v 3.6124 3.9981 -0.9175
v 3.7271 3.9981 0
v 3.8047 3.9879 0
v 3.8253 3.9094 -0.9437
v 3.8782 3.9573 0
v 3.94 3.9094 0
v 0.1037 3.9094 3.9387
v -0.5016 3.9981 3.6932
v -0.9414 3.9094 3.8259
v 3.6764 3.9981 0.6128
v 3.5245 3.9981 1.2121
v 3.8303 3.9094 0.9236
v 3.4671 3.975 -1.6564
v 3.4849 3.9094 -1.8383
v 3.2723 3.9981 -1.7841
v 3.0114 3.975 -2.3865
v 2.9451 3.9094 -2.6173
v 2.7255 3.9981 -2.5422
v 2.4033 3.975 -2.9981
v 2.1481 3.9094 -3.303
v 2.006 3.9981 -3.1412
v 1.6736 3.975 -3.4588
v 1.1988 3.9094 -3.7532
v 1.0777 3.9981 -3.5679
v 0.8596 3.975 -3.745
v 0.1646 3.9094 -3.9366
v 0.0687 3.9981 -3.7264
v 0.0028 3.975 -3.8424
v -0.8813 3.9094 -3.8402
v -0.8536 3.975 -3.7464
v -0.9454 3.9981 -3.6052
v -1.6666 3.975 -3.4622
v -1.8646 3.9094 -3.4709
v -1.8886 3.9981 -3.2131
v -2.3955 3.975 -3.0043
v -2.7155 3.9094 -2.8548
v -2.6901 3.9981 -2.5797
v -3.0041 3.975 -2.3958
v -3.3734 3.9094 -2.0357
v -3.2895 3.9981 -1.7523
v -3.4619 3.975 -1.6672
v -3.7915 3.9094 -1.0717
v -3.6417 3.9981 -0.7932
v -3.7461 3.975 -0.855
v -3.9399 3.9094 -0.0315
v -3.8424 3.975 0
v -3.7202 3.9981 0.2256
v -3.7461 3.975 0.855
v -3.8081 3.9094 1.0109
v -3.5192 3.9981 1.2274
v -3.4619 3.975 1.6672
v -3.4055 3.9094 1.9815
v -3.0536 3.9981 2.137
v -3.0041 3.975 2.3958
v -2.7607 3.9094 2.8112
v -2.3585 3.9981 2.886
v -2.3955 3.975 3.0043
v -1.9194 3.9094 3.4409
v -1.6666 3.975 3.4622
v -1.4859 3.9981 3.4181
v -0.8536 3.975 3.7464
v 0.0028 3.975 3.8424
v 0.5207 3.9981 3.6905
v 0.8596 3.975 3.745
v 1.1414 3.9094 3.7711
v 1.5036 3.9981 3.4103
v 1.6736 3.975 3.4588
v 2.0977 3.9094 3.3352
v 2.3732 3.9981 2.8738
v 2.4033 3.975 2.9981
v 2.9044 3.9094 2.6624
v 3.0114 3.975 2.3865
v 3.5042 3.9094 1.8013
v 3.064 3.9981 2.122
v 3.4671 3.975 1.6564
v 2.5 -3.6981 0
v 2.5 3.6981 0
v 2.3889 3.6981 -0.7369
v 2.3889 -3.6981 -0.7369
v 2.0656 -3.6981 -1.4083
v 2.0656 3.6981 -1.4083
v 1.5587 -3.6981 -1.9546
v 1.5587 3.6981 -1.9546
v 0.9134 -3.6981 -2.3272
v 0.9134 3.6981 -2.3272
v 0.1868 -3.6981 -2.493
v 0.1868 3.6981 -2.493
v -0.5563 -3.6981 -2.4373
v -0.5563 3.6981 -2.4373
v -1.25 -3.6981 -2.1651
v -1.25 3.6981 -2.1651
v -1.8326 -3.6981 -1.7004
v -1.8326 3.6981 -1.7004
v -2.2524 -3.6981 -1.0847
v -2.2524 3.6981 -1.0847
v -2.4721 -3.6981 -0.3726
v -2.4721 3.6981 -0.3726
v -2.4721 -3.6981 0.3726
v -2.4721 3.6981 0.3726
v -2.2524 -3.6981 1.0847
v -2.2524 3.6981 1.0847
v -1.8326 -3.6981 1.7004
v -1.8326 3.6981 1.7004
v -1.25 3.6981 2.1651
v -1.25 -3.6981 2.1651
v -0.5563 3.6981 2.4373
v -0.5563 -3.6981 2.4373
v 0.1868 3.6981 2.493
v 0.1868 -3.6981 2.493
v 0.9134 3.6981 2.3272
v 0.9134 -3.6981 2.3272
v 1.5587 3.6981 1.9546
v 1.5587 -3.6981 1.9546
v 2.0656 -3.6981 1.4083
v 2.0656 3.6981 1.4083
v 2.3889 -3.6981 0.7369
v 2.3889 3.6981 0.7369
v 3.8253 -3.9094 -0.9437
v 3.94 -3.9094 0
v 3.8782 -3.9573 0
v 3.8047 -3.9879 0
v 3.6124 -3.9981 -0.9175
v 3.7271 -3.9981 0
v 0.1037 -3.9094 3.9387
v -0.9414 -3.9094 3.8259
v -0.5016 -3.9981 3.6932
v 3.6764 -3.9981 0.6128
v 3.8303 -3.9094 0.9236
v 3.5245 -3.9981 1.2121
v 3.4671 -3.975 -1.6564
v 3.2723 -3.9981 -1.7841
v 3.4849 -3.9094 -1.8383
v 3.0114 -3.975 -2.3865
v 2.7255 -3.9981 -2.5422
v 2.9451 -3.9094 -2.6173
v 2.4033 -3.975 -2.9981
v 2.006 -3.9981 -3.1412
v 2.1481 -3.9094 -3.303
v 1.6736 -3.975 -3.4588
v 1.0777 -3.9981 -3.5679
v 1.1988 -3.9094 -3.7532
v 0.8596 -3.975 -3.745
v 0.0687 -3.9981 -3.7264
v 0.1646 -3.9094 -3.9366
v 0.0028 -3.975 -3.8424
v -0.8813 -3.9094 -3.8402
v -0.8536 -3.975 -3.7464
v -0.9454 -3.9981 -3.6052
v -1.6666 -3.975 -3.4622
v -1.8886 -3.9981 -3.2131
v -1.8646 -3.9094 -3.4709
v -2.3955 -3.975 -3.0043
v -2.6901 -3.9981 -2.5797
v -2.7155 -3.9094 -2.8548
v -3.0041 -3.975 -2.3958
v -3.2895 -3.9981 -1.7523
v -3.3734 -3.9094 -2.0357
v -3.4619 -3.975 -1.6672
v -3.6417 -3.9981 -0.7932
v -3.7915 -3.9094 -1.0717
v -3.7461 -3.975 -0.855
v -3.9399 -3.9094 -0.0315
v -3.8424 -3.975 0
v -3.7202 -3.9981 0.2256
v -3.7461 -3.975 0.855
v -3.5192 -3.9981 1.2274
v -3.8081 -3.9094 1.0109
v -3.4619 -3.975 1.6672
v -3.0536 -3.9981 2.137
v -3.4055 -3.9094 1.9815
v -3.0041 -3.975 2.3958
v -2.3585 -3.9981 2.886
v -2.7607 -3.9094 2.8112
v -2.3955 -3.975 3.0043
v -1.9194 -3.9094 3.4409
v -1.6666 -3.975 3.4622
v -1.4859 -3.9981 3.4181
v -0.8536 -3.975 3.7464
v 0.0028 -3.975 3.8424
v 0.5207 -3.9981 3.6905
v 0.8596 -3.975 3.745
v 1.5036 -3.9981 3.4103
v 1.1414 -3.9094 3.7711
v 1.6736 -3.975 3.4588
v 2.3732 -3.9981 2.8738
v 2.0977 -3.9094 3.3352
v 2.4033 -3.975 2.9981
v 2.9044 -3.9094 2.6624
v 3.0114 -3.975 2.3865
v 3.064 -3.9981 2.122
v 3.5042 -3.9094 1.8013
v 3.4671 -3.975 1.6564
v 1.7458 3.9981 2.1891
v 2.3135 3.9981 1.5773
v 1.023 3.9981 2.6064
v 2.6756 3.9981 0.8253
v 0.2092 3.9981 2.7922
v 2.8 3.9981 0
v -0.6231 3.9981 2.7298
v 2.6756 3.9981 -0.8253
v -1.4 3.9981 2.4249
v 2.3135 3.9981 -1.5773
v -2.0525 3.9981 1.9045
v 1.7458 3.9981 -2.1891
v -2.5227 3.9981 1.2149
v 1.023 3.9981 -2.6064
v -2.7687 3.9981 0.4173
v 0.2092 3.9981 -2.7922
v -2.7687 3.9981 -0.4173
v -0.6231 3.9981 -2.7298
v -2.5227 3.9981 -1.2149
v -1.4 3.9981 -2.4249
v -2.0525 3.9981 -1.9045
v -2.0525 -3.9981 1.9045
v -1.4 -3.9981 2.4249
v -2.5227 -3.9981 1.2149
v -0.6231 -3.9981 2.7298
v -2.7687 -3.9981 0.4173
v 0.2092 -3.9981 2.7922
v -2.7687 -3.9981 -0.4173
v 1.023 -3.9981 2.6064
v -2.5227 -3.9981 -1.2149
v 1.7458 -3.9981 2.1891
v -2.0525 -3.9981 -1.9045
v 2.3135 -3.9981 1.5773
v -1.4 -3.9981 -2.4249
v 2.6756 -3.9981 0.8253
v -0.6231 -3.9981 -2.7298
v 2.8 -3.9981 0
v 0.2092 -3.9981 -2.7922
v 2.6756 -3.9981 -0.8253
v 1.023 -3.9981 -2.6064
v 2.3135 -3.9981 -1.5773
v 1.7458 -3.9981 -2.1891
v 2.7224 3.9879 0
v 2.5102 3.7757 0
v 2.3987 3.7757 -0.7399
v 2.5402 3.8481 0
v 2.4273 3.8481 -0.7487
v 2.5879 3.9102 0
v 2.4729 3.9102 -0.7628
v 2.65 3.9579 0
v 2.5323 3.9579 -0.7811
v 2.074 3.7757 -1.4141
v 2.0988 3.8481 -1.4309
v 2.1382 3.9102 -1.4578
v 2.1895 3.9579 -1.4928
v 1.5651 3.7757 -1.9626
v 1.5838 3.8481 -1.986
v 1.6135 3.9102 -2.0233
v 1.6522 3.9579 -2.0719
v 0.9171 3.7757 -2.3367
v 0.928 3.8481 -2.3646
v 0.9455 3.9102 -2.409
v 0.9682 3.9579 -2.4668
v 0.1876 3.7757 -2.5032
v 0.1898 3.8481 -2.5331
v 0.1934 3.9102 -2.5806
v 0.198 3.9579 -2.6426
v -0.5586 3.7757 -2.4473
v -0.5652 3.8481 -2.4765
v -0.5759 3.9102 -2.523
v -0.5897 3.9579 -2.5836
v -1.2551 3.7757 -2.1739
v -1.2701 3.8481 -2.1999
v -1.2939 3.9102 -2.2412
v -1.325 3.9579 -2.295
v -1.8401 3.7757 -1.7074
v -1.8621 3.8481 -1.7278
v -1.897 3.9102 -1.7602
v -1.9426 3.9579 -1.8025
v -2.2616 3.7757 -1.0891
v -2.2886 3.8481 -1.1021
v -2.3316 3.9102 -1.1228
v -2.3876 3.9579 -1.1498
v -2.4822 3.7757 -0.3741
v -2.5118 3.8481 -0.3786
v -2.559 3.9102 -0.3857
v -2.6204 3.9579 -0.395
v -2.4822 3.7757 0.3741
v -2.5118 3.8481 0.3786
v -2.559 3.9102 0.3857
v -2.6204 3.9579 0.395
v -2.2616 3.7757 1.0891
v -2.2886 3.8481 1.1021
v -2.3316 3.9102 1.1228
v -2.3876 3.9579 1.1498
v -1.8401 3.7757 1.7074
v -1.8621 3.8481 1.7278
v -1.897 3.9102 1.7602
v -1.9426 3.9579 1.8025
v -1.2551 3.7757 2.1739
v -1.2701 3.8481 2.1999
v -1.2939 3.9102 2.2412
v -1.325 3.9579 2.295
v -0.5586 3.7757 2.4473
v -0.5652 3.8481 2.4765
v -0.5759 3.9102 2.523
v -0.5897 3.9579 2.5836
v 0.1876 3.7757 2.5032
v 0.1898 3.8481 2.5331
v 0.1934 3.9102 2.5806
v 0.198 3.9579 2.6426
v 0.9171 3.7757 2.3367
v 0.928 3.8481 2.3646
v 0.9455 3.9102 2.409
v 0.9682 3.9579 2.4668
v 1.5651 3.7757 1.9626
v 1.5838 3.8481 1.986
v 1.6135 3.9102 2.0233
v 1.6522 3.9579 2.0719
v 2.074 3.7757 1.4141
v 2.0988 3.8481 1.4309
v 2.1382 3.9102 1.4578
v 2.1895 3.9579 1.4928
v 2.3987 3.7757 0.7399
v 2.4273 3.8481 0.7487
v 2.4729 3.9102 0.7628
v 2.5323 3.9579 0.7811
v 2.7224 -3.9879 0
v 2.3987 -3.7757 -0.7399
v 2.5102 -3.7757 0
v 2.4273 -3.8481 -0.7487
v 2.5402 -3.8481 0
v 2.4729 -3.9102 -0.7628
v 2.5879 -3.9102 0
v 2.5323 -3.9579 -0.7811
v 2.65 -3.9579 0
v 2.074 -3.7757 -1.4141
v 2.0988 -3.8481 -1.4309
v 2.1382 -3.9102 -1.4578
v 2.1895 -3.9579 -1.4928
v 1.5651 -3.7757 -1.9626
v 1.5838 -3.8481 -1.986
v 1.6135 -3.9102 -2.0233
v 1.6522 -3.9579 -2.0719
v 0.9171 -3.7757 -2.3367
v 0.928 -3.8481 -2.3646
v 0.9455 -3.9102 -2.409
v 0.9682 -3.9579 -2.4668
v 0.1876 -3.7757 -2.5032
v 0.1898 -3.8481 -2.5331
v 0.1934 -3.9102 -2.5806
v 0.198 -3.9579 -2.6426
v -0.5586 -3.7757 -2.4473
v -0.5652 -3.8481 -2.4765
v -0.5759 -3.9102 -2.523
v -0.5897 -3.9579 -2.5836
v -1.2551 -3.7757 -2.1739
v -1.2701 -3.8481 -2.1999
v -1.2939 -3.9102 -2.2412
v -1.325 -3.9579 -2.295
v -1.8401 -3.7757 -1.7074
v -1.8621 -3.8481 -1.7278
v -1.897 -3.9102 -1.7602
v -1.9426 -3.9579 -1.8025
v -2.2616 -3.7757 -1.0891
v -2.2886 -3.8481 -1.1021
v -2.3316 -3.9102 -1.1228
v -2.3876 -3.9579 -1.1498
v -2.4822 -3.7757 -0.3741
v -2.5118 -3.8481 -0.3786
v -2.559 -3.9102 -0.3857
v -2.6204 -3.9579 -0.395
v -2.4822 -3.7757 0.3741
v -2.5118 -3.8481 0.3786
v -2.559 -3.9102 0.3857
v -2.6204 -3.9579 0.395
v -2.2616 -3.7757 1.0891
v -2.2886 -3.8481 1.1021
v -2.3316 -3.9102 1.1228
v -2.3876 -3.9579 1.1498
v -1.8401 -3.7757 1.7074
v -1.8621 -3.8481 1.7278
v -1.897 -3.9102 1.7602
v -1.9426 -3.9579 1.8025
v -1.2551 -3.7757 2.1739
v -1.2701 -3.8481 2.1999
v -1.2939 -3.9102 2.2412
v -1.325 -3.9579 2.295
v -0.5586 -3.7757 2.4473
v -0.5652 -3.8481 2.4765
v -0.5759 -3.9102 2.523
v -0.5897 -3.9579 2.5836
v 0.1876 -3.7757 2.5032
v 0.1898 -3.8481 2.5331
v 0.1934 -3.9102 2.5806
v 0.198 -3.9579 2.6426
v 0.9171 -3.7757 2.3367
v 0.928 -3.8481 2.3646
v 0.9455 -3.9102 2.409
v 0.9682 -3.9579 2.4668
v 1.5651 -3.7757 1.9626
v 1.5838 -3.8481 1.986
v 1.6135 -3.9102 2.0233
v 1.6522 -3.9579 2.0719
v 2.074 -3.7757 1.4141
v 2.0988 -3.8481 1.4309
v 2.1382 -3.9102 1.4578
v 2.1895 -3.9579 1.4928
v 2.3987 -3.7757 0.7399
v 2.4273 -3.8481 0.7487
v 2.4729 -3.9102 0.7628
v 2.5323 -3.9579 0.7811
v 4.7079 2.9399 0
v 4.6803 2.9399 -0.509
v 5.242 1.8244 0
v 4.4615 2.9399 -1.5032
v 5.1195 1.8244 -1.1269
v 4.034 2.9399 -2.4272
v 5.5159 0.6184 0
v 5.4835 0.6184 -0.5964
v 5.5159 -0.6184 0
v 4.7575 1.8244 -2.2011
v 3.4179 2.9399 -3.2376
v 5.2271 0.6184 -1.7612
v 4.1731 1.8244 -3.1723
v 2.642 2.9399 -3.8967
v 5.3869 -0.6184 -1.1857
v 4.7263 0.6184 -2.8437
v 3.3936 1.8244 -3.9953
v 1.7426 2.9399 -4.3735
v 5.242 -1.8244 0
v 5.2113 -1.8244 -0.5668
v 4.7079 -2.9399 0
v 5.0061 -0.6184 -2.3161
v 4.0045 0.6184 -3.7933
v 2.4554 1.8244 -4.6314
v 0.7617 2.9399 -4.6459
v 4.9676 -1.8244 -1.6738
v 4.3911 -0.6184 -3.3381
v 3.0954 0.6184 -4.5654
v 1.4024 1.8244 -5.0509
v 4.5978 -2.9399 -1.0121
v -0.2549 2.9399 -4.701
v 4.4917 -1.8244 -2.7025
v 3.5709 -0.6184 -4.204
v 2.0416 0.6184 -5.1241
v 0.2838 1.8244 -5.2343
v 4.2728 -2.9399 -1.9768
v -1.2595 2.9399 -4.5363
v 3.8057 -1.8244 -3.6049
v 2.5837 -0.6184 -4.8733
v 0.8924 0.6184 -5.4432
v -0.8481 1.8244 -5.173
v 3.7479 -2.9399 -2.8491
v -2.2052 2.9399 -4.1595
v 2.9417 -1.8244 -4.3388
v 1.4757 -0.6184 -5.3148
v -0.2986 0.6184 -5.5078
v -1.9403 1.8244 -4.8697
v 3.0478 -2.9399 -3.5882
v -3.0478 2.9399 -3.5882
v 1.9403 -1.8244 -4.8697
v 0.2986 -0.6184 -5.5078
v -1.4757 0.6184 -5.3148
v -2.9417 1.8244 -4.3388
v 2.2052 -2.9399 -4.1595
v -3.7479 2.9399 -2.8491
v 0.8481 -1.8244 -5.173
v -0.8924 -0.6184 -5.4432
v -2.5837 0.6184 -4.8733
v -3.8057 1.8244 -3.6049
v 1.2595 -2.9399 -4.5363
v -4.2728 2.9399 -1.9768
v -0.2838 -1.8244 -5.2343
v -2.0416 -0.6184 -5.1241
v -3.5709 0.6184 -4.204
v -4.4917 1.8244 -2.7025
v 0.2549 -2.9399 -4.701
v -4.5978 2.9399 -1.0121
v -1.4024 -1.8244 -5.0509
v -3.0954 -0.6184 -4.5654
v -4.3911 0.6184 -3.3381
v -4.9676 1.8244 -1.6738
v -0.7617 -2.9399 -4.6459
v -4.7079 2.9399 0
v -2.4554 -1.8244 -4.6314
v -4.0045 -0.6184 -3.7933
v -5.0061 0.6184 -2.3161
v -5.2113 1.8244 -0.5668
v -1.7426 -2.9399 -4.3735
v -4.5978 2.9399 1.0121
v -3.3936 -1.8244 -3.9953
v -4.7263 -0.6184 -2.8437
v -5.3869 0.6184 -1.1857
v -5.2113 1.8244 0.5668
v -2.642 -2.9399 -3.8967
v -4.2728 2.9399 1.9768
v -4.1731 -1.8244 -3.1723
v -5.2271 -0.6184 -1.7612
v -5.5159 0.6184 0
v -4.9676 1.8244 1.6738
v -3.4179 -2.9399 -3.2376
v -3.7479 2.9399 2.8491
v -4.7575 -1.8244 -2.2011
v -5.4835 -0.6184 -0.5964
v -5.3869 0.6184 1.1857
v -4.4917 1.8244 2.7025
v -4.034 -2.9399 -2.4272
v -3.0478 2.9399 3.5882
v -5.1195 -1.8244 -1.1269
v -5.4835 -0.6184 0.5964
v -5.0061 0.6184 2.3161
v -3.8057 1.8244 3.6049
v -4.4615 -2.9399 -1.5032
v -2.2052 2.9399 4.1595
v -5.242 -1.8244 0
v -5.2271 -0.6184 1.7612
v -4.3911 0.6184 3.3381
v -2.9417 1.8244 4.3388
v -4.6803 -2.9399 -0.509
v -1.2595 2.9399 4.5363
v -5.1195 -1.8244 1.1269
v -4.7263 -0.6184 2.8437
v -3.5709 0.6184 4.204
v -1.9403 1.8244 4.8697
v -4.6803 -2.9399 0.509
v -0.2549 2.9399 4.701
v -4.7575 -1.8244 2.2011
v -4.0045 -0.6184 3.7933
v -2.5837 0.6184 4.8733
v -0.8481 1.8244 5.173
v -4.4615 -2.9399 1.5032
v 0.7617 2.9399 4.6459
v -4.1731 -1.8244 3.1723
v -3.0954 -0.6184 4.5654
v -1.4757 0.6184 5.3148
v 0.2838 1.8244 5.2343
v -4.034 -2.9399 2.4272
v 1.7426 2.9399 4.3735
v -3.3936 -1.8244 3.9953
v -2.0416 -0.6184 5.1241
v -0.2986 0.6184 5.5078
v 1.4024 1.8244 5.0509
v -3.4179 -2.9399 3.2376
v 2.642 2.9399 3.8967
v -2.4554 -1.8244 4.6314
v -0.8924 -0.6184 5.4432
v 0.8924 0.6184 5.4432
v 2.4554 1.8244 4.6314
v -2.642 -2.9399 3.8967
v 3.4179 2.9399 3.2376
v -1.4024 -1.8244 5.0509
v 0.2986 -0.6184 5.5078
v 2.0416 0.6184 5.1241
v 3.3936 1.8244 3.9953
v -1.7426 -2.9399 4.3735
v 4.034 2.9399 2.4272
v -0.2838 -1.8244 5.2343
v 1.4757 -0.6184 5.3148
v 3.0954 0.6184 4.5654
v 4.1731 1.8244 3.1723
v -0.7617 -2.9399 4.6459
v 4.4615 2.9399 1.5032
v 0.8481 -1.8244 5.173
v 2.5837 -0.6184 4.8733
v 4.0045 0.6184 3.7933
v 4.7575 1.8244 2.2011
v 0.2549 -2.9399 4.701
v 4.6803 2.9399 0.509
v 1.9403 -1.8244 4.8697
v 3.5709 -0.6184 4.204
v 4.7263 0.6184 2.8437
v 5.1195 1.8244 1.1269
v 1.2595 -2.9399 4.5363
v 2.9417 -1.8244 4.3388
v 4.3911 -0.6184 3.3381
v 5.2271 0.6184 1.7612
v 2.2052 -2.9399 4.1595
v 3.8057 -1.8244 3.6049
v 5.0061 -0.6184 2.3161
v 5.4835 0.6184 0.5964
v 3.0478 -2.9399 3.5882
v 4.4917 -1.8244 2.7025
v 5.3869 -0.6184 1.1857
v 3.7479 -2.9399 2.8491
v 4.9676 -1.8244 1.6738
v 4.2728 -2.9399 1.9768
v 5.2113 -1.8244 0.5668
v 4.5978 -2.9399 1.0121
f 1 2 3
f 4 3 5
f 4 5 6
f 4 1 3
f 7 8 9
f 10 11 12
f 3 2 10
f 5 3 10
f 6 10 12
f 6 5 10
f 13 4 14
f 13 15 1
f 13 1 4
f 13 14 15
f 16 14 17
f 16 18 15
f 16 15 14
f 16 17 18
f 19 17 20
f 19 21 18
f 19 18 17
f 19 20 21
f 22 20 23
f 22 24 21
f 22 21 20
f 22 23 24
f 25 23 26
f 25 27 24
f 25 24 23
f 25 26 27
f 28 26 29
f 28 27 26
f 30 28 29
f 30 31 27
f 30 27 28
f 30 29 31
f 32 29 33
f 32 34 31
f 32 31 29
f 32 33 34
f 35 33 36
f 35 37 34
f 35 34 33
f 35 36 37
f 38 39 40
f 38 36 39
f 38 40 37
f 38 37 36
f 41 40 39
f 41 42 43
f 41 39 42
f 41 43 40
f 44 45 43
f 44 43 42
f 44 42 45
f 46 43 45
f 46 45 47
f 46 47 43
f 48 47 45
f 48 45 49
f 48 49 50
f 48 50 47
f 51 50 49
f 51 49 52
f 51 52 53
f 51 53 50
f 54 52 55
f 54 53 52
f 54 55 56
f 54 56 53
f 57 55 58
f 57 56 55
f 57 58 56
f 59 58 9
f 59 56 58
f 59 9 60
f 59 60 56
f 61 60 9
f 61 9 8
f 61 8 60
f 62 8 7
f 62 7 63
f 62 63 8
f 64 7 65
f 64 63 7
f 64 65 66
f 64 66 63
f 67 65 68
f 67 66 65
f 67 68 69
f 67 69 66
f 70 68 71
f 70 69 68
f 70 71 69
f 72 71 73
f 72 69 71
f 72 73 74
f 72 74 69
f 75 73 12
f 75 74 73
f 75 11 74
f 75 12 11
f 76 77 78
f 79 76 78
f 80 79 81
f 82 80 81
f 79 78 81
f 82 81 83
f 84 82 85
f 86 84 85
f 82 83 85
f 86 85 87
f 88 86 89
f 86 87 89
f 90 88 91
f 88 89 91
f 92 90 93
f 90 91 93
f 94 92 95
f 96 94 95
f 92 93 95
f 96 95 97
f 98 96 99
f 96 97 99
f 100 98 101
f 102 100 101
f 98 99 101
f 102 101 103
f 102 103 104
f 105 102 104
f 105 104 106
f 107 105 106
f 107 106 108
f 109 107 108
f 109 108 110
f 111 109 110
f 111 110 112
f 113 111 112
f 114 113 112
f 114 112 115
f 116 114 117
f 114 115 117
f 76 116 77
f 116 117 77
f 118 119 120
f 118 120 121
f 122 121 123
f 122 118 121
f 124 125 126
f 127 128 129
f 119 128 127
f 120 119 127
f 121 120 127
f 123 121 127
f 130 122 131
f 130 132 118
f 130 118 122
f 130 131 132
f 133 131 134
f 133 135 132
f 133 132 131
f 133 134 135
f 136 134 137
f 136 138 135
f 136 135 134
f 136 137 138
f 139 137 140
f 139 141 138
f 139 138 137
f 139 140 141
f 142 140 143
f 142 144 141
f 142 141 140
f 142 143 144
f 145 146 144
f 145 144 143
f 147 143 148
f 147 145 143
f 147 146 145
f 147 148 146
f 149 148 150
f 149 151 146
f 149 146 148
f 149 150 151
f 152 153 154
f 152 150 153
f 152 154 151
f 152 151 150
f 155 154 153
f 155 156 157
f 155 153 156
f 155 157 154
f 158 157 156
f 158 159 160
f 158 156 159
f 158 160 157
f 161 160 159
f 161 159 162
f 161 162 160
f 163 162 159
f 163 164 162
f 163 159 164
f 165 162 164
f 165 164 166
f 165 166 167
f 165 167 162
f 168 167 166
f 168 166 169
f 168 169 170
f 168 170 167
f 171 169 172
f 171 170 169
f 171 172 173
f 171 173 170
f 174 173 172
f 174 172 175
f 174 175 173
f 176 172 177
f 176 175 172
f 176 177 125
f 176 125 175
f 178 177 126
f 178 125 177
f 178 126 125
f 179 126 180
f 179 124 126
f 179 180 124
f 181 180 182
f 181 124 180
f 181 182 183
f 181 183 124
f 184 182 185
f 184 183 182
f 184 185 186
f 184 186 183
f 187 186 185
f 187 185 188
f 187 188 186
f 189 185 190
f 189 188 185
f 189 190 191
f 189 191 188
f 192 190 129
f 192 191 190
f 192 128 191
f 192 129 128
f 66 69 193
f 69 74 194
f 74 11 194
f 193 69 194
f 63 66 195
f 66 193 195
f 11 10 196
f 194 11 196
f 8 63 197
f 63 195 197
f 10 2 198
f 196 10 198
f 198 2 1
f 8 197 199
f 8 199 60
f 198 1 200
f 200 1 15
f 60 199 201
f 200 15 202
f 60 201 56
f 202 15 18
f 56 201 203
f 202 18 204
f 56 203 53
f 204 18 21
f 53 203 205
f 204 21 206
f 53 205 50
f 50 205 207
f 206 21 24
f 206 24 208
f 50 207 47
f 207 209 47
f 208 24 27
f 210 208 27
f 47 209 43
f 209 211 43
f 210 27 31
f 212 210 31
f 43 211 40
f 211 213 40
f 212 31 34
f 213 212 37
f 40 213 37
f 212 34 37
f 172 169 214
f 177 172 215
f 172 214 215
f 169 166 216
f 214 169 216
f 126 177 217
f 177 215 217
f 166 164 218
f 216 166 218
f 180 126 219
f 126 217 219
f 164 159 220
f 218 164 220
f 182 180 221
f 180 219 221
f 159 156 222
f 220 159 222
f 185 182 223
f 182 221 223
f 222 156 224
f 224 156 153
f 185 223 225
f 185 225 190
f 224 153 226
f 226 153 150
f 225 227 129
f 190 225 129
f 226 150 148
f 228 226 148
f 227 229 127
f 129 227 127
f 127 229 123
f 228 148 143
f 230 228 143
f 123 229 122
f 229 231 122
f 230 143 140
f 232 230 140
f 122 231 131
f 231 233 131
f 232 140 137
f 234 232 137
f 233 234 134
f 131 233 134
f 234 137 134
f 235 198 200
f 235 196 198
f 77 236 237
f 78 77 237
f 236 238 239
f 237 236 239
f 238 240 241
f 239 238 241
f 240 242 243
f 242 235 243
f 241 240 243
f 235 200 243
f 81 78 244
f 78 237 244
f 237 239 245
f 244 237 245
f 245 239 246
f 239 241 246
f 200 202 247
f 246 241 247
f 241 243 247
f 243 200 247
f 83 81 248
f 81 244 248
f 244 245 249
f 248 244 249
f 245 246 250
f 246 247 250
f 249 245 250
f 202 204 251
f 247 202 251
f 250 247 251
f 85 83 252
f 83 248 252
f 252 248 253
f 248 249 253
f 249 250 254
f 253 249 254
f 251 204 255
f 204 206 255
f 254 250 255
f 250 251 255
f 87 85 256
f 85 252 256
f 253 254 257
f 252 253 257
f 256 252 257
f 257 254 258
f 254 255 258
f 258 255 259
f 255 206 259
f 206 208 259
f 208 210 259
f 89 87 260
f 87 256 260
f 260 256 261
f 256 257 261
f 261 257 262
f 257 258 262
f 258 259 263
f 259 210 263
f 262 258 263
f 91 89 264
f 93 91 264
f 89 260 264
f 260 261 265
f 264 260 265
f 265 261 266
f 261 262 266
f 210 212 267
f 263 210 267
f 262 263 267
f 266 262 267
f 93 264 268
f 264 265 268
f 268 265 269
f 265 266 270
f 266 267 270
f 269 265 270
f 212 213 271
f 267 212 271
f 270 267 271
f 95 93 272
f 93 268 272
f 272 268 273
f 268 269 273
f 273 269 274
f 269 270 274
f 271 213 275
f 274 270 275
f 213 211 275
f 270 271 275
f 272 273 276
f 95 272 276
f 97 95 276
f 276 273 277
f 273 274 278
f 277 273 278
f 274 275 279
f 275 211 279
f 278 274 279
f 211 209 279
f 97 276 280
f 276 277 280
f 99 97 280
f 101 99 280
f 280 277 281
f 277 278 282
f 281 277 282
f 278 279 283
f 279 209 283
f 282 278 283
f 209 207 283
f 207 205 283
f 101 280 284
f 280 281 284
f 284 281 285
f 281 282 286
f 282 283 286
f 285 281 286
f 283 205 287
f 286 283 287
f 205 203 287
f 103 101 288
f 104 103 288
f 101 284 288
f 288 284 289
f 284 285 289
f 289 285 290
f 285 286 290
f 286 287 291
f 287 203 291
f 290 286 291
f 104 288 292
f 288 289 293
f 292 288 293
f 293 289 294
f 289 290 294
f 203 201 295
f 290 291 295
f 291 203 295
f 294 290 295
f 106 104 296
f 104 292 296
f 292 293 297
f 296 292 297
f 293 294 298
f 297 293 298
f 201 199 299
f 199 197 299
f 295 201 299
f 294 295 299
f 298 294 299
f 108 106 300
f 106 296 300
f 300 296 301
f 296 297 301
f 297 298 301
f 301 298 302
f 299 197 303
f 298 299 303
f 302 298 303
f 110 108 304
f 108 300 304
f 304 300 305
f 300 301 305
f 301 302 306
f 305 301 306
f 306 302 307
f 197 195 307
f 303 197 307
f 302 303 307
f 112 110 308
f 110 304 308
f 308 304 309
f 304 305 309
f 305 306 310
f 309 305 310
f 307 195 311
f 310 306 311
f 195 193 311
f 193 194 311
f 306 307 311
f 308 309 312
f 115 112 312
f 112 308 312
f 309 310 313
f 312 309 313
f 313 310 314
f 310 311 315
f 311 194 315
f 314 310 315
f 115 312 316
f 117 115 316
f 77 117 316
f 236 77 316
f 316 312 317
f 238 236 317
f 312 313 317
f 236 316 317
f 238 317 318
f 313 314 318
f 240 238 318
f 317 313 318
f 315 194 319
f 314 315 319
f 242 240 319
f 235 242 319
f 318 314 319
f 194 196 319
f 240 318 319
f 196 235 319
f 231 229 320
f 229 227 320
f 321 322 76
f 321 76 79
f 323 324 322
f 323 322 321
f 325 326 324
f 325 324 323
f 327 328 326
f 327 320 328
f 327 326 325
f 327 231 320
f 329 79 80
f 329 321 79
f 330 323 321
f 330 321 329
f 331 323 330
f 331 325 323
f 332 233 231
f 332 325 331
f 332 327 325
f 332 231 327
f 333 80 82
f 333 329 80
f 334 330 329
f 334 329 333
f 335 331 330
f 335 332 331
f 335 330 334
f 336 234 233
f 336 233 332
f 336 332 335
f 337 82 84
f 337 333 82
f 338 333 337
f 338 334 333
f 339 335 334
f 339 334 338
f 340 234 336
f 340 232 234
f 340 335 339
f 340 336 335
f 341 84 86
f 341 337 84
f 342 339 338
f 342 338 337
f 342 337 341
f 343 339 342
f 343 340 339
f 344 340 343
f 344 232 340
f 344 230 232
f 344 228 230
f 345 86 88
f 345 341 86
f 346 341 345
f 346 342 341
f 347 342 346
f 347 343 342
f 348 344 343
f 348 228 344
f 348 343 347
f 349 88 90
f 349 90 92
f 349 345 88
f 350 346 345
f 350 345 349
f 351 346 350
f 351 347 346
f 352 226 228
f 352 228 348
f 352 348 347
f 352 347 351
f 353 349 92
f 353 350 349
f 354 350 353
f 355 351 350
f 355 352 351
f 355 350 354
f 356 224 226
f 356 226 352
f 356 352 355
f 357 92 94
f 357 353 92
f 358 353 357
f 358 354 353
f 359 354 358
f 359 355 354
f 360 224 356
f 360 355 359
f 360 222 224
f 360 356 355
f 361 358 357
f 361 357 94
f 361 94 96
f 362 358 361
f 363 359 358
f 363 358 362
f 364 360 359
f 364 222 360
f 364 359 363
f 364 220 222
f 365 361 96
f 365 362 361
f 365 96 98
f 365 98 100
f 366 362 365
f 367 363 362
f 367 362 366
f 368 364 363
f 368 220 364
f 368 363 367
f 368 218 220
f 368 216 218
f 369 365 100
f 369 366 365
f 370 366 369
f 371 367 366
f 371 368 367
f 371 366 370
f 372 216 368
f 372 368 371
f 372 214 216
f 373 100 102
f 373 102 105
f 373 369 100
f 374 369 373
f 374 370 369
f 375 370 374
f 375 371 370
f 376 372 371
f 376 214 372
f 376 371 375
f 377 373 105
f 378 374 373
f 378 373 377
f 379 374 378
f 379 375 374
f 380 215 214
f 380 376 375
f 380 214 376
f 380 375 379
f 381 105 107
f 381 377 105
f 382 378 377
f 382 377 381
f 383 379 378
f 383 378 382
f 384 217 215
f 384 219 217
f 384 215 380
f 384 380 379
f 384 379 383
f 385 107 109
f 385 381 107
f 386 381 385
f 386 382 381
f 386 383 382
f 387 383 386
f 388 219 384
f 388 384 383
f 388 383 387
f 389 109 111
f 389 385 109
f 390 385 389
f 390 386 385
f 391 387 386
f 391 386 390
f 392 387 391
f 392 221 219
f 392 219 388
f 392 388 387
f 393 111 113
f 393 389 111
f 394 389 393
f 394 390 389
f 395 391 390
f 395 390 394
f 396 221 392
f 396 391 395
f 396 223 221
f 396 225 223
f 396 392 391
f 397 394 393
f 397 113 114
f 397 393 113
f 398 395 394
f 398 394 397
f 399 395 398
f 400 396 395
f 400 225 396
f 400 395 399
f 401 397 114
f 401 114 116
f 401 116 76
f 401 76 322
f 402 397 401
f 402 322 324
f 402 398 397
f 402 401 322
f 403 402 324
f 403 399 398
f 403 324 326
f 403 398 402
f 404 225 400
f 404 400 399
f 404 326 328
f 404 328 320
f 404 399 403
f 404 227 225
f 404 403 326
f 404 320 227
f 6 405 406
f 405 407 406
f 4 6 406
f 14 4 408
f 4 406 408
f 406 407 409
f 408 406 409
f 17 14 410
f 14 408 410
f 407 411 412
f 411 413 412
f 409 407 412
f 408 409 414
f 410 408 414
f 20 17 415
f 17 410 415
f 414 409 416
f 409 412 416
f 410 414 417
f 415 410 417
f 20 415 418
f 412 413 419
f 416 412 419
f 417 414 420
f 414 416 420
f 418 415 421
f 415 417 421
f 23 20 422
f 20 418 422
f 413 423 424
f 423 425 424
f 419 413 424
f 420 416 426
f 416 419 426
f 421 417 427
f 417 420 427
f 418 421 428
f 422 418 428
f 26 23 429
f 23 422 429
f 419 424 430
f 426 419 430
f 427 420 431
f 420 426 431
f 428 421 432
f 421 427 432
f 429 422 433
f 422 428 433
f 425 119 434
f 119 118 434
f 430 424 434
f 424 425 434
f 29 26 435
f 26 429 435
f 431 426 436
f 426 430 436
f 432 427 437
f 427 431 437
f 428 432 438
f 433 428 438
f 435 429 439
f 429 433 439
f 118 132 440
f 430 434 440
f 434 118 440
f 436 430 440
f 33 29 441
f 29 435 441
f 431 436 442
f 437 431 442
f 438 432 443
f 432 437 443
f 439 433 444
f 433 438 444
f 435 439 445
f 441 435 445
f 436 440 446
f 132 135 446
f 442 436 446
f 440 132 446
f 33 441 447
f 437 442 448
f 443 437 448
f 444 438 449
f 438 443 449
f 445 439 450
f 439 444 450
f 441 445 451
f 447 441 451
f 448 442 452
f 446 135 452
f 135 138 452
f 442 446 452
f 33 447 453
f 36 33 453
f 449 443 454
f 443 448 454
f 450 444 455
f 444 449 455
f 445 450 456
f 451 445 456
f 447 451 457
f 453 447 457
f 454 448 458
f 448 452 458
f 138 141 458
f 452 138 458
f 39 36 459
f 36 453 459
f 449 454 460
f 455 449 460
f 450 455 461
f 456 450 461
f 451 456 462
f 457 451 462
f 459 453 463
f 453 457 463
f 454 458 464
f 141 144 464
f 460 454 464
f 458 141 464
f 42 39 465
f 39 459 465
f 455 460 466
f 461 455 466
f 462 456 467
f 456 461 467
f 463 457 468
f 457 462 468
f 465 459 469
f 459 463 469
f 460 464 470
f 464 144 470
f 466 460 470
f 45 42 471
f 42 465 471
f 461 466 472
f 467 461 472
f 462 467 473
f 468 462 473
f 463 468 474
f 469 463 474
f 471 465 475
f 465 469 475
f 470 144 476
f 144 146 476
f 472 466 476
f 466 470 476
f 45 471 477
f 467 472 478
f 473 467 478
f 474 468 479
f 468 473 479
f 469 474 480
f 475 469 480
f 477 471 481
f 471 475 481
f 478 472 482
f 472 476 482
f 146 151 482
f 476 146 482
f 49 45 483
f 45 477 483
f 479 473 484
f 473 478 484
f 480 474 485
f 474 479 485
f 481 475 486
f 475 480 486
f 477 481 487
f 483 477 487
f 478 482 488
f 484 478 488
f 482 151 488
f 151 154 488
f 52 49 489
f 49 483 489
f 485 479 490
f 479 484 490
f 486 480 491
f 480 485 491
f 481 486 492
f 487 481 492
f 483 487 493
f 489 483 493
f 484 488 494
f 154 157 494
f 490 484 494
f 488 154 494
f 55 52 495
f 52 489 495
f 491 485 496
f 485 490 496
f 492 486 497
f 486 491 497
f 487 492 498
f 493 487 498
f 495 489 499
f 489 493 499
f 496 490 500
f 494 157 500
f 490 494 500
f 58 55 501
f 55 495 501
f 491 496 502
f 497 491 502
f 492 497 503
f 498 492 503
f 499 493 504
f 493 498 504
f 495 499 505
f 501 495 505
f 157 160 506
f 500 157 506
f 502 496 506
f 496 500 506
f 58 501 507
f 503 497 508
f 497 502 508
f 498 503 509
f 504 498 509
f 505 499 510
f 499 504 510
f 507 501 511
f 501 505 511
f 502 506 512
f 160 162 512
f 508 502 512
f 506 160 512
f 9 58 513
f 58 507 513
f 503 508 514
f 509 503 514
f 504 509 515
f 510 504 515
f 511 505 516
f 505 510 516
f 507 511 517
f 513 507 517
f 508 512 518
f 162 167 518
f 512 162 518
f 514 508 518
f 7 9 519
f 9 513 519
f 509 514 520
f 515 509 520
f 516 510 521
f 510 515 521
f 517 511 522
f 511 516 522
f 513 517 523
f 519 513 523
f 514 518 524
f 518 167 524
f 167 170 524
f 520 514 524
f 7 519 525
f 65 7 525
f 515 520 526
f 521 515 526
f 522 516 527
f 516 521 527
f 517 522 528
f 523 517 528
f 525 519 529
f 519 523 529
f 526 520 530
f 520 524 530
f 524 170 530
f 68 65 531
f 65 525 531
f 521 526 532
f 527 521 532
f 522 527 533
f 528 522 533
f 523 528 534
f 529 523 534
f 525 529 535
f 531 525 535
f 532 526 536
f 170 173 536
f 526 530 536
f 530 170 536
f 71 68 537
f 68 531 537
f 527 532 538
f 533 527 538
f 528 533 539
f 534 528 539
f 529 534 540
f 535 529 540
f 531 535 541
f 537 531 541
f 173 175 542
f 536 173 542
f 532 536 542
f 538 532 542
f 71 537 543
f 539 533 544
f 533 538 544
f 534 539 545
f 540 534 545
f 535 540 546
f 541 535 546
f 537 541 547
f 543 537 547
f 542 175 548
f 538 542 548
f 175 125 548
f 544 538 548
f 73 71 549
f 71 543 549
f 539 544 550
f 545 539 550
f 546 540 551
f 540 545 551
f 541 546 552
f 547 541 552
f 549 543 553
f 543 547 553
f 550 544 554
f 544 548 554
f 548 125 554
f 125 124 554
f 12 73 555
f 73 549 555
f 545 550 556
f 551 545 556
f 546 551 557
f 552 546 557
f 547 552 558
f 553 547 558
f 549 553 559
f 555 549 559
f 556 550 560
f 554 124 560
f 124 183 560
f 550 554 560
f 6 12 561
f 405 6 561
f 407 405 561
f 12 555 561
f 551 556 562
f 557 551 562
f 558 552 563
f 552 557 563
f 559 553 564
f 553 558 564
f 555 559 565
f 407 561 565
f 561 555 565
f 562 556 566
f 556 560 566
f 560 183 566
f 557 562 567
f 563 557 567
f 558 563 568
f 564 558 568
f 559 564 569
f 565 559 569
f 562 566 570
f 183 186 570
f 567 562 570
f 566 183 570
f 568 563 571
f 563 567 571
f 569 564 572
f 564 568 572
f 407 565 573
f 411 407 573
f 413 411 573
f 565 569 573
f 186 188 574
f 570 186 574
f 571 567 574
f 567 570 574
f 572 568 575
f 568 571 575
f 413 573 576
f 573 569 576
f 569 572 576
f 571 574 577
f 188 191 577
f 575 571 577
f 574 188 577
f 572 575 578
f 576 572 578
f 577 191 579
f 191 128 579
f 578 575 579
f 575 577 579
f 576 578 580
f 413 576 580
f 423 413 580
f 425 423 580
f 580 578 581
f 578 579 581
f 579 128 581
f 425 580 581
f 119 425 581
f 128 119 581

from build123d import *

# Parameters (mm, degrees)
FILLET1_R = 0.3


with BuildPart() as part:
    # Sketch2 → Revolve1 (revolve)
    with BuildSketch(Plane.XY):
        with BuildLine():
            Line((2.5, -3.998088338), (2.5, 3.998088338))
            Line((2.5, 3.998088338), (3.85, 3.998088338))
            ThreePointArc((3.85, 3.998088338), (5.55042434, 0), (3.85, -3.998088338))
            Line((3.85, -3.998088338), (2.5, -3.998088338))
        make_face()
    revolve(axis=Axis((0, 0, 0), (0, 1, 0)))

    # Fillet1
    fillet1_edges = [part.edges().sort_by_distance(p)[0] for p in [
        (-3.85, 3.998088338, 0),
        (-3.85, -3.998088338, 0),
        (-2.5, -3.998088338, 0),
        (-2.5, 3.998088338, 0),
    ]]
    fillet(fillet1_edges, radius=FILLET1_R)


solid = part.part
